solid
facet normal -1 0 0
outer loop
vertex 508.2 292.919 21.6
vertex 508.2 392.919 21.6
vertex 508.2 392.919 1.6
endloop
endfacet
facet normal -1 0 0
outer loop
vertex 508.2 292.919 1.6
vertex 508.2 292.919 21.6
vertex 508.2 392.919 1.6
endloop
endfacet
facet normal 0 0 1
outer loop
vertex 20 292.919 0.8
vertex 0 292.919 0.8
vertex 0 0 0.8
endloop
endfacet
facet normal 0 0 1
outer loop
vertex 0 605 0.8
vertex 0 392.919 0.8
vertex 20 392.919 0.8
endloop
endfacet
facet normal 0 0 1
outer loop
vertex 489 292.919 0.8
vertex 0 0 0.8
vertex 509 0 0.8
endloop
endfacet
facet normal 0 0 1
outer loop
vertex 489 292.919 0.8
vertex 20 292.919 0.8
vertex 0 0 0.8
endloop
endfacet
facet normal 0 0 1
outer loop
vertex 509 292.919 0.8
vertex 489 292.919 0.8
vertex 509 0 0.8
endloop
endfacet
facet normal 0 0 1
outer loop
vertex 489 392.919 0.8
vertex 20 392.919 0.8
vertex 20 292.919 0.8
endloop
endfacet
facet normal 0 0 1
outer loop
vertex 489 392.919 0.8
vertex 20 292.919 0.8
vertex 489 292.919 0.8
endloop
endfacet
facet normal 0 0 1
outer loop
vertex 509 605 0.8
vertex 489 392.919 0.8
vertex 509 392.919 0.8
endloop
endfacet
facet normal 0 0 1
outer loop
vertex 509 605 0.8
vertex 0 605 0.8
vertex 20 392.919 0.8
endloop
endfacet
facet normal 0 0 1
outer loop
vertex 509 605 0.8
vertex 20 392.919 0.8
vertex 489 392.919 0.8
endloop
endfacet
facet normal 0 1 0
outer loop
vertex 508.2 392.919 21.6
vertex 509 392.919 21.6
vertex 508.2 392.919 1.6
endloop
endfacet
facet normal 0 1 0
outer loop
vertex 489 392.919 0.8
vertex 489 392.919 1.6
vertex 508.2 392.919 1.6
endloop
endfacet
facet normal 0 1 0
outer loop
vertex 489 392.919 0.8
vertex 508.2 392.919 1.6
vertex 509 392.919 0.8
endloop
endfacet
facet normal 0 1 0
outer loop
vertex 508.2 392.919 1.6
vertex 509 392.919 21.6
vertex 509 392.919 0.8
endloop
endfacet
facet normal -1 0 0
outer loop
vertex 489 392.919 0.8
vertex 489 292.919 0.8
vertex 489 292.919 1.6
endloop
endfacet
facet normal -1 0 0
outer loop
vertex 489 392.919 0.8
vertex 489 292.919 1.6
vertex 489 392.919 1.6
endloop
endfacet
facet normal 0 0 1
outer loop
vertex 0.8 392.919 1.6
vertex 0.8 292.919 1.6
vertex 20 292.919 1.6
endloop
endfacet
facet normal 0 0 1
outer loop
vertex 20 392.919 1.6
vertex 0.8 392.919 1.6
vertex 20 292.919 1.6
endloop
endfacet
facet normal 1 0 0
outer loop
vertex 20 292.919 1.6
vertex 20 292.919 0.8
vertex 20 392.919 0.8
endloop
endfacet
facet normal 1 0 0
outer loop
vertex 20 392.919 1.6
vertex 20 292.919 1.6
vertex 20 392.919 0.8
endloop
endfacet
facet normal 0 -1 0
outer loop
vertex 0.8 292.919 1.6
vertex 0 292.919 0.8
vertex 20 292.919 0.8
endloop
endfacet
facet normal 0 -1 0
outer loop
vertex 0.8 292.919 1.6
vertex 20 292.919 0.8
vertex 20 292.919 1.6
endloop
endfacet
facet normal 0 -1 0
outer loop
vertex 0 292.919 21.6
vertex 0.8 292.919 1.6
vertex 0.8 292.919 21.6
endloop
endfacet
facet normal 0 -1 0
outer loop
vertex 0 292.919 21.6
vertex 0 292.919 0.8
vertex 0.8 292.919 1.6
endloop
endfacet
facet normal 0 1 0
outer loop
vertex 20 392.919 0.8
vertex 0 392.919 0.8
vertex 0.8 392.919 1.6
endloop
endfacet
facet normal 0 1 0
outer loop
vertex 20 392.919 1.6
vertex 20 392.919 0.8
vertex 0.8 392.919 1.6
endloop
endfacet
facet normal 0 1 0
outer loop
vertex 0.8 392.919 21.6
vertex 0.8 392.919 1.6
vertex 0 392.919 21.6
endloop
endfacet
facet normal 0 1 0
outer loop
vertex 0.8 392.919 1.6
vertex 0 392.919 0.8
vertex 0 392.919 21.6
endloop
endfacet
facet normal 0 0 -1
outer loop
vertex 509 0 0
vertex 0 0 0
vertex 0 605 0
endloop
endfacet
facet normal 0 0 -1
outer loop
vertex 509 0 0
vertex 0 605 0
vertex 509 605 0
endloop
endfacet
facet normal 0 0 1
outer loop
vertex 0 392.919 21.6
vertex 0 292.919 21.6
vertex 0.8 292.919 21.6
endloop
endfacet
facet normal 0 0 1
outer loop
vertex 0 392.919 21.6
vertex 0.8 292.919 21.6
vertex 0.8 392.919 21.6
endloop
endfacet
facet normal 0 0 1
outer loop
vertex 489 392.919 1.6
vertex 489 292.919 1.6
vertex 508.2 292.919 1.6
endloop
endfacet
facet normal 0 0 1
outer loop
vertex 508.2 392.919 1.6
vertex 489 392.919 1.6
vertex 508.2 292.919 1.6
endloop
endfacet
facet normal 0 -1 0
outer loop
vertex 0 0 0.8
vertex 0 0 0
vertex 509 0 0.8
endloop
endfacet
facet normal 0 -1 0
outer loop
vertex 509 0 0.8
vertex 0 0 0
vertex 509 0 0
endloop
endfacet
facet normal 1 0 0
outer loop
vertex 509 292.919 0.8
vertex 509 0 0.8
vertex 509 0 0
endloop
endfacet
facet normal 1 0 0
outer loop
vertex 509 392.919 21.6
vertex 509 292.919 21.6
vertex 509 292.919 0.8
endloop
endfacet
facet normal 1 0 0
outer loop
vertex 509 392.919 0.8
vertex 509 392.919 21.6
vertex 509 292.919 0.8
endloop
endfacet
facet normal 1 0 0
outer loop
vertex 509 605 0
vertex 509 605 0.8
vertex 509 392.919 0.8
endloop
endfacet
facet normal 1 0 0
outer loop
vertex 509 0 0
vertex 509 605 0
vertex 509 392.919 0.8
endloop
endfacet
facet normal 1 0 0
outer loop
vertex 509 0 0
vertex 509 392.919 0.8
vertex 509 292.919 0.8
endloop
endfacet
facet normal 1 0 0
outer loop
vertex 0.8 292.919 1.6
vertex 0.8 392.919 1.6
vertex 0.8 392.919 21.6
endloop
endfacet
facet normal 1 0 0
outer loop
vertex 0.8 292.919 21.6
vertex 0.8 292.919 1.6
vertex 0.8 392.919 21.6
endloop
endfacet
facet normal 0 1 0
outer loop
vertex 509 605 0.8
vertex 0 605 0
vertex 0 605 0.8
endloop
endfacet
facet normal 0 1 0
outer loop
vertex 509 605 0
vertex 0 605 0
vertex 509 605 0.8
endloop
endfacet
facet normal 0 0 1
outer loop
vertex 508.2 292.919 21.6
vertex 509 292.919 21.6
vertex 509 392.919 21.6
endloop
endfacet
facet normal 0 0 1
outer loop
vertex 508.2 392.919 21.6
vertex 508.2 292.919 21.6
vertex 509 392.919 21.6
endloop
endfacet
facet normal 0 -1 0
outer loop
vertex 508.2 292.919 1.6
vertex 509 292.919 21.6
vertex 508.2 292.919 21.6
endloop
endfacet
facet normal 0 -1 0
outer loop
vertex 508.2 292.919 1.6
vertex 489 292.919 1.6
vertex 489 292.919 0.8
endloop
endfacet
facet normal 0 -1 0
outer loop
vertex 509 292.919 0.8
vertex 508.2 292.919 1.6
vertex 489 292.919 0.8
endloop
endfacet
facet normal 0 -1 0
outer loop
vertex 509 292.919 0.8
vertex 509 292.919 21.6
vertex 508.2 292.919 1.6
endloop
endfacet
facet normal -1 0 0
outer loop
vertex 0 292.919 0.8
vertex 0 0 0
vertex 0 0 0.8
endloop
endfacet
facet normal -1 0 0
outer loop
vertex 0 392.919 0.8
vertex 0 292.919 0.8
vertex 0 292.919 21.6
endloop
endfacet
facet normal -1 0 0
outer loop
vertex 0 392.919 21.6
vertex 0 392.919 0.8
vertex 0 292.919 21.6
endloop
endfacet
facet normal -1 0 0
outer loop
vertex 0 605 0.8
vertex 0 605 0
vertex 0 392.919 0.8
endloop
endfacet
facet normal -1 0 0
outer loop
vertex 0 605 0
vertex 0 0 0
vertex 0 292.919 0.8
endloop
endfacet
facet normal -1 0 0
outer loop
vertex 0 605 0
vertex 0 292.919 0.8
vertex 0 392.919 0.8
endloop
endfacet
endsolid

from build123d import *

# Parameters (mm, degrees)
SKETCH1_W           = 509
SKETCH1_H           = 605
BOSS_EXTRUDE1_DEPTH = 0.8
SKETCH2_W           = 20
SKETCH2_H           = 100
BOSS_EXTRUDE2_DEPTH = 0.8
SKETCH4_W           = 20
SKETCH4_H           = 100
BOSS_EXTRUDE3_DEPTH = 0.8
SKETCH5_W           = 20
SKETCH5_H           = 100
BOSS_EXTRUDE4_DEPTH = 0.8


with BuildPart() as part:
    # Sketch1 → Boss-Extrude1 (new body)
    with BuildSketch(Plane.XY):
        with Locations((254.5, 302.5)):
            Rectangle(SKETCH1_W, SKETCH1_H)
    extrude(amount=BOSS_EXTRUDE1_DEPTH)

    # Sketch2 → Boss-Extrude2 (add)
    with BuildSketch(Plane.XY.offset(0.8)):
        with Locations((10, 342.918789735)):
            Rectangle(SKETCH2_W, SKETCH2_H)
        with Locations((499, 342.918789735)):
            Rectangle(SKETCH2_W, SKETCH2_H)
    extrude(amount=BOSS_EXTRUDE2_DEPTH)

    # Sketch4 → Boss-Extrude3 (add)
    with BuildSketch(Plane.ZY):
        with Locations((11.6, 342.918789735)):
            Rectangle(SKETCH4_W, SKETCH4_H)
    extrude(amount=-BOSS_EXTRUDE3_DEPTH)

    # Sketch5 → Boss-Extrude4 (add)
    with BuildSketch(Plane(origin=(509, 0, 0), x_dir=(0, 0, -1), z_dir=(1, 0, 0))):
        with Locations((-11.6, 342.918789735)):
            Rectangle(SKETCH5_W, SKETCH5_H)
    extrude(amount=-BOSS_EXTRUDE4_DEPTH)


solid = part.part
